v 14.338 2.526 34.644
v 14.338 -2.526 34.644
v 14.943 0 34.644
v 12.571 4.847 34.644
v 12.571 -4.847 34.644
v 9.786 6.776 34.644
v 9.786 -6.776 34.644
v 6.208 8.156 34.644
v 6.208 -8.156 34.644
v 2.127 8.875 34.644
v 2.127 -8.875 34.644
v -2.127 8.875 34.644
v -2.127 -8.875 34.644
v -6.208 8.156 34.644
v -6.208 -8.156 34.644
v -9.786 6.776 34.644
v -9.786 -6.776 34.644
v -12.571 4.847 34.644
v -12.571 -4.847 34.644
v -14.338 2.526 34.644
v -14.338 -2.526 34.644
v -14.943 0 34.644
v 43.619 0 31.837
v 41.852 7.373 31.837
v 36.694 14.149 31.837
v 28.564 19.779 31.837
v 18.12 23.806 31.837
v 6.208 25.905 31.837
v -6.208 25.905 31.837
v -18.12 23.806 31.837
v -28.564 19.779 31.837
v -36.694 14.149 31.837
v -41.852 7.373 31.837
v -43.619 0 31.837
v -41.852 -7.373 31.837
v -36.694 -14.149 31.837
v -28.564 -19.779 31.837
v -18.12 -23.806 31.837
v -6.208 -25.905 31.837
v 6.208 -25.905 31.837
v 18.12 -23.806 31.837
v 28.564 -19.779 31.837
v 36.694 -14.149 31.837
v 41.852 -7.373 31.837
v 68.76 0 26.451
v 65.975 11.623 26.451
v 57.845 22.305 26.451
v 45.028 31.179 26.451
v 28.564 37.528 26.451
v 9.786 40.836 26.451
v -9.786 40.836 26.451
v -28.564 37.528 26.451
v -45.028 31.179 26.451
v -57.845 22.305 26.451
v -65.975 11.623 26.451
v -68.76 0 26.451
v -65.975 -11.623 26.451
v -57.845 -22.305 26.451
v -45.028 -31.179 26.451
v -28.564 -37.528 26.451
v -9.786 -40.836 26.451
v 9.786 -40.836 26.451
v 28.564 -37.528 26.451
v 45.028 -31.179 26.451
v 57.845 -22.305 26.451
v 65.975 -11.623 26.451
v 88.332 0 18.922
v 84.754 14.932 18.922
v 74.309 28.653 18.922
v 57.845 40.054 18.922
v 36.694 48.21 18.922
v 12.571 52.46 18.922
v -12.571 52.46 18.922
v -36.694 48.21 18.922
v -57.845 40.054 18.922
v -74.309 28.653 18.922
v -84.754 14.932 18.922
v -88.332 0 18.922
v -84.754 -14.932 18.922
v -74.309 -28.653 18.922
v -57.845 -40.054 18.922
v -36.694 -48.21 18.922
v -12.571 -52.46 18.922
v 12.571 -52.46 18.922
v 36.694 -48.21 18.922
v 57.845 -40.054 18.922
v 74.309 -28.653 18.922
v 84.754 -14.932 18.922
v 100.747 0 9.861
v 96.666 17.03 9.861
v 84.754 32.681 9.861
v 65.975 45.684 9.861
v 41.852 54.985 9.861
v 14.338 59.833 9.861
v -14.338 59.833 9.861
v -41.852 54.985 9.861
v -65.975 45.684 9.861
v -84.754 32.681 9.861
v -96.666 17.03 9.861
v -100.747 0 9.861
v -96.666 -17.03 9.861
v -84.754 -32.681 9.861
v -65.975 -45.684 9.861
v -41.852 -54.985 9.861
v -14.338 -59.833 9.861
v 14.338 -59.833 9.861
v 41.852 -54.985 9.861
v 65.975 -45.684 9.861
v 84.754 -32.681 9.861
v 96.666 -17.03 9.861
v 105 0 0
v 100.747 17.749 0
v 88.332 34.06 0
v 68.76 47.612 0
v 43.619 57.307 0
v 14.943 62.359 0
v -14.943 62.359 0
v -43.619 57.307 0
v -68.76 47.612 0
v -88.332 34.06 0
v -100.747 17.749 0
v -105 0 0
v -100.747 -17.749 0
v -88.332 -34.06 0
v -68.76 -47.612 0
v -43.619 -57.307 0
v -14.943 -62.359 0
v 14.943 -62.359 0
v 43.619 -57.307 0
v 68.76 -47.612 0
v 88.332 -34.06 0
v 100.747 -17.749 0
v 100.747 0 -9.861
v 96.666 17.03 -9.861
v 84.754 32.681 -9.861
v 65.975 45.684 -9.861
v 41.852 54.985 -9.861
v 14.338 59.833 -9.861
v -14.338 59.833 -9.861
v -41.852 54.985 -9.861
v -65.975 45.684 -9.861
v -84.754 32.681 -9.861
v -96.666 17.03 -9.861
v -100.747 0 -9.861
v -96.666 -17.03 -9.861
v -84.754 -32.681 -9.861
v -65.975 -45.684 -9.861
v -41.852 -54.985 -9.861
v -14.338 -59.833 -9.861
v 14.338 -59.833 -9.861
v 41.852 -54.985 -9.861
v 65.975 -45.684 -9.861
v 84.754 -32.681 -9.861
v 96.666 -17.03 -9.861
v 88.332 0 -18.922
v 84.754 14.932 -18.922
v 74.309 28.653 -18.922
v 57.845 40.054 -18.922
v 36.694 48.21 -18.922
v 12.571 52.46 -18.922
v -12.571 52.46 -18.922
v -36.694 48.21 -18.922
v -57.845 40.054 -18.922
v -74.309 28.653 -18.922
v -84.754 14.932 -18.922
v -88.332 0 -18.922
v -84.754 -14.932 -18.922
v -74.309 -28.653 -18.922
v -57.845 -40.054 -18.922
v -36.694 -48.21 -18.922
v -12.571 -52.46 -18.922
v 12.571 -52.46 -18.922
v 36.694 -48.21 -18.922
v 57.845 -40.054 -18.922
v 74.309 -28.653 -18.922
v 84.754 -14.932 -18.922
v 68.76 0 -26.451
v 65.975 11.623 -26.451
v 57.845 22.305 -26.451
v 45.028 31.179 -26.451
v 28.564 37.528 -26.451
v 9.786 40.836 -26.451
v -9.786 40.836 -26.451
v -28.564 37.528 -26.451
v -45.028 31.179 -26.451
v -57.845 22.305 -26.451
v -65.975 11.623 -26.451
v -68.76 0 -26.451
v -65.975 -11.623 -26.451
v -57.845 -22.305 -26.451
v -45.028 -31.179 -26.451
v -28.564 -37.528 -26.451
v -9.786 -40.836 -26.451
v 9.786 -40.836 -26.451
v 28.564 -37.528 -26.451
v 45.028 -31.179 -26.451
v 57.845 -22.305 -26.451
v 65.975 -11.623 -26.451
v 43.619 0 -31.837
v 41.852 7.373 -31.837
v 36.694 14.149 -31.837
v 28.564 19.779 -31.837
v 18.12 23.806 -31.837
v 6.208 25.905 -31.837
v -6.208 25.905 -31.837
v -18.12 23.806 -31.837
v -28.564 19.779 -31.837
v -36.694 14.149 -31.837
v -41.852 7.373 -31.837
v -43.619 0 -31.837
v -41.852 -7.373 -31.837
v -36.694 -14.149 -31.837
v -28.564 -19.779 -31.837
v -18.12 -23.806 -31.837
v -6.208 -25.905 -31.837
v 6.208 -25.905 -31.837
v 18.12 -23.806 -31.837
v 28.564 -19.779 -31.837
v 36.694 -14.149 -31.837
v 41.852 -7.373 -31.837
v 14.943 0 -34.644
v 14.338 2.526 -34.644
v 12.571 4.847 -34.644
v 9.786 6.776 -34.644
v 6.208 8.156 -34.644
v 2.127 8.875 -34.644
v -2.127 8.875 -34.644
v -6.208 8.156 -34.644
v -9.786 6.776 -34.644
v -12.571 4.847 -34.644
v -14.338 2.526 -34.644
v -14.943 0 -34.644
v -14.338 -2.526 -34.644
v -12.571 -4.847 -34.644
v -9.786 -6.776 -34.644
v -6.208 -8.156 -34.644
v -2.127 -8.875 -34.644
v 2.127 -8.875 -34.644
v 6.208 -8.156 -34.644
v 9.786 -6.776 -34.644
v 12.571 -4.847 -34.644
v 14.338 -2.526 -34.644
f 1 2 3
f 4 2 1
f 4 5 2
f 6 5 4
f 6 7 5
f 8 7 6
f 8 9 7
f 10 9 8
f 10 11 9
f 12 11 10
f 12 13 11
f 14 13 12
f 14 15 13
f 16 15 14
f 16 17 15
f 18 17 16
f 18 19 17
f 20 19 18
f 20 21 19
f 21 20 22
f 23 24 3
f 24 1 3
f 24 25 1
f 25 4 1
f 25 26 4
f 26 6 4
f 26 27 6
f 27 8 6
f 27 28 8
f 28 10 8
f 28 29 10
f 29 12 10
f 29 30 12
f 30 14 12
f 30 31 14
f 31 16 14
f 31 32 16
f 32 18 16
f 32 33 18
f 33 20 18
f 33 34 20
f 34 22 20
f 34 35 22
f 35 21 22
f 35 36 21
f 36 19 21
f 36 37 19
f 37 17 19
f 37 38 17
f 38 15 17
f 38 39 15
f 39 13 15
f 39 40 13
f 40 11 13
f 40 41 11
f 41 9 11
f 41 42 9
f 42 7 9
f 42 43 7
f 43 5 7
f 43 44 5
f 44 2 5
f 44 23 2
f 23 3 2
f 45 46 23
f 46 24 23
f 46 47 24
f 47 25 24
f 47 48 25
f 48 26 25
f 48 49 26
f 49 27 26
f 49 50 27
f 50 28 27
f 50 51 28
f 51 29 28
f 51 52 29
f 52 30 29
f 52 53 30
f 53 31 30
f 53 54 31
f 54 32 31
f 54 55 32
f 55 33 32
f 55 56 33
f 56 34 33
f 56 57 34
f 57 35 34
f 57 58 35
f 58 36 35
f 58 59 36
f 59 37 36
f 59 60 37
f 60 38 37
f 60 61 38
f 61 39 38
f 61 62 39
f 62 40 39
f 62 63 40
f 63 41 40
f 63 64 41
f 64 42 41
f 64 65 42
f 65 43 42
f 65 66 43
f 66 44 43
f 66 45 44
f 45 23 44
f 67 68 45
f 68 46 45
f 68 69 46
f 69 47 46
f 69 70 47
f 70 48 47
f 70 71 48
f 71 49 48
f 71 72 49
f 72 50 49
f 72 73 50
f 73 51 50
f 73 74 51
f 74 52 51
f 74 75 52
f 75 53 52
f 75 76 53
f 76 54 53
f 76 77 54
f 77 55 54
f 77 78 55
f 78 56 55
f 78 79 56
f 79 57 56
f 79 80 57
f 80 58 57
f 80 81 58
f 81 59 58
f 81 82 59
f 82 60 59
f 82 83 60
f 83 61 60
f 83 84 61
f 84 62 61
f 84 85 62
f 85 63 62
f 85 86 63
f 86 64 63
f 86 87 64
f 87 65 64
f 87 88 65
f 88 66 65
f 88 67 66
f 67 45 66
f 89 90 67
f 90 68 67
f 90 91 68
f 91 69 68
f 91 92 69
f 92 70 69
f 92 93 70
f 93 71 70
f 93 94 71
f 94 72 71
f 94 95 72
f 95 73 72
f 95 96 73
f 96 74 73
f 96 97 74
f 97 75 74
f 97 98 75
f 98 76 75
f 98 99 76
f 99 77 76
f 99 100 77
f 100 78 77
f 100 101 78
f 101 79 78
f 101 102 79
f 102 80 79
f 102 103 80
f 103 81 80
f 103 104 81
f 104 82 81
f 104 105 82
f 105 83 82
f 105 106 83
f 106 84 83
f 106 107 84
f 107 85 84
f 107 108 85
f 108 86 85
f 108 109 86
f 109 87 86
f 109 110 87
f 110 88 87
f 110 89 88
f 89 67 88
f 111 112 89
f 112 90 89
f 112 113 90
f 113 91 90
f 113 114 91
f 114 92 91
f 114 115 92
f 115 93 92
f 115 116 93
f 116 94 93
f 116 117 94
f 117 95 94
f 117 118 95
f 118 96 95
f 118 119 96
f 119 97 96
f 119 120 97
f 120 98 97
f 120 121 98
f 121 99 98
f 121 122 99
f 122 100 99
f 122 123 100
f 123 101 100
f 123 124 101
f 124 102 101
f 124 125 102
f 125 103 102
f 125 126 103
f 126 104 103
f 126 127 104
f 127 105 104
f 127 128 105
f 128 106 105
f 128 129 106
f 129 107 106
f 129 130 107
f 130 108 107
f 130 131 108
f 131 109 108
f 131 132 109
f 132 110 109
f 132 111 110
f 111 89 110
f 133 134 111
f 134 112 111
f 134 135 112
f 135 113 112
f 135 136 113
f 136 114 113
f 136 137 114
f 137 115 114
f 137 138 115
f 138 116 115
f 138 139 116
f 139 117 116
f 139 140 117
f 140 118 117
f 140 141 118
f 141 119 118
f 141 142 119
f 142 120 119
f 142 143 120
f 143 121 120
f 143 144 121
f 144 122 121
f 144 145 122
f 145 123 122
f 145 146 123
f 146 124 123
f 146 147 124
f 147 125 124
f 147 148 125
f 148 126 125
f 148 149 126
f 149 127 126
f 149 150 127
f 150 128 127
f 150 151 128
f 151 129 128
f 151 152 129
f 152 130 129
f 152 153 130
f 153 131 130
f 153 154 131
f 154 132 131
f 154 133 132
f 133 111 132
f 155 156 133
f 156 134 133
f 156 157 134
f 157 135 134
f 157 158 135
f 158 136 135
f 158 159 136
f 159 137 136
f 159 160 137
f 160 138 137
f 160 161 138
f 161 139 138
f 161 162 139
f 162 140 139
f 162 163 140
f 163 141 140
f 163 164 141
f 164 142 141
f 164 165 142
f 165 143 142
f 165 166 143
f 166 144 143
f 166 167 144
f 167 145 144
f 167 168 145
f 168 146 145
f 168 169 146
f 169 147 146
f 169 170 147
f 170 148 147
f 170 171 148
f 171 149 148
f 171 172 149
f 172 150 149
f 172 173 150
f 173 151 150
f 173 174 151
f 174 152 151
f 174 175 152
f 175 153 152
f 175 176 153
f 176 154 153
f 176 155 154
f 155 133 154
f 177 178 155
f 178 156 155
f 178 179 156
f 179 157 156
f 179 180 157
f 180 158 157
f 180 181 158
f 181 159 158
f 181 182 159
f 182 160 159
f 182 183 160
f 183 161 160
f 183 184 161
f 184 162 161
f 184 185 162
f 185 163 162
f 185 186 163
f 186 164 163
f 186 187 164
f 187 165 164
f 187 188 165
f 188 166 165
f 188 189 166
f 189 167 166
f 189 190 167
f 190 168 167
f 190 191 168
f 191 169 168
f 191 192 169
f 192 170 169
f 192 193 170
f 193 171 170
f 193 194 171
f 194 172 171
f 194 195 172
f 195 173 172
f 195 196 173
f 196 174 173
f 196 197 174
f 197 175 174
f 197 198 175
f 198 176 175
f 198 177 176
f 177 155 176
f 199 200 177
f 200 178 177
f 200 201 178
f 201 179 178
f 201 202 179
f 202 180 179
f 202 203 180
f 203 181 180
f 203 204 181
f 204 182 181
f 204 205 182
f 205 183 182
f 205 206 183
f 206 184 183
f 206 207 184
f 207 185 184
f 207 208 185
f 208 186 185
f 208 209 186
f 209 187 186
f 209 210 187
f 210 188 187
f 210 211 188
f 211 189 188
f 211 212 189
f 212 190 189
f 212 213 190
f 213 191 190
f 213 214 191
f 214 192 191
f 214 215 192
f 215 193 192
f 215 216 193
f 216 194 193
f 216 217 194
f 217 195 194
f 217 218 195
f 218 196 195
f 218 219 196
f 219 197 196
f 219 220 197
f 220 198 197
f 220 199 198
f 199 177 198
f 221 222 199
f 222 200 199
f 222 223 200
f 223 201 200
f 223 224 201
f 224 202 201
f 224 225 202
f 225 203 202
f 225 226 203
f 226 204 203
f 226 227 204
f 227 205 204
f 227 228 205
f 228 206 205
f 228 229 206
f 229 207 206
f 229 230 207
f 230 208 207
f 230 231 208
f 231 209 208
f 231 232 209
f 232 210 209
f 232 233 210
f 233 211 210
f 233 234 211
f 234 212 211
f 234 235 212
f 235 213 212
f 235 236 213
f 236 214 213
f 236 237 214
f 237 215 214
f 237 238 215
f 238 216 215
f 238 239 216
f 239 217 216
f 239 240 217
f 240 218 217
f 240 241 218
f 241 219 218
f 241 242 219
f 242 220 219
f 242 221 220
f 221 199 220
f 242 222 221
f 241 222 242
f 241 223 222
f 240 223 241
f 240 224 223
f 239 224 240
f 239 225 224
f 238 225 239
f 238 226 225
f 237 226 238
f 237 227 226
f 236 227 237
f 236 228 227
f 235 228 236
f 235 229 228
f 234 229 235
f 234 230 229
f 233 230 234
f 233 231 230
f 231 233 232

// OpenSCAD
// Generated by SolidPython 1.0.1 on 2020-07-29 00:46:51


scale(v = [15, 9, 5]) {
	sphere(r = 7);
}
/***********************************************
*********      SolidPython code:      **********
************************************************
 
# import packages: SolidPython
from solid import *
from solid.utils import *
from itertools import chain, combinations, permutations


class Resize:

    def __init__(self, scad_file):
        self.scad_file = scad_file
        #self.scad_file = import_scad(scad_file)
        # cone/cylinder param:
        self.r1 = 0
        self.r2 = 0
        self.h = 0
        # rectangular prism param:
        self.w = 0
        self.l = 0
        # ellipse param:
        self.r = 0

    # import OpenScad code (file name corresponds to shape)


    # classify shape + parameters
    def assign(self, param1, param2, param3):
        if self.scad_file == 'cone.scad':
            self.r1 = param1
            self.r2 = param2
            self.h = param3
        elif self.scad_file == 'cylinder.scad':
            self.r1 = param1
            self.r2 = param2
            self.h = param3
        elif self.scad_file == 'rectangularPrism.scad':
            self.h = param1
            self.l = param2
            self.w = param3
        else:
            self.r = param1
            self.h = param2

    # resize parameters
    def iterate(self):
        x = range(3, 20, 2)
        i = 1
        if self.scad_file == 'cone.scad':
            tempList = list(permutations(x, 2))
            for temp in tempList:
                param1 = temp[0]
                param2 = temp[1]
                filepath = 'produced_scad_files/' + 'cone' + str(param1) + '_' + str(param2) + '_' + '.scad'
                scad_render_to_file(cylinder(h=param1, r1=param2, r2=0), filepath)

        elif self.scad_file == 'cylinder.scad':
            tempList = list(permutations(x, 3))
            for temp in tempList:
                param1 = temp[0]
                param2 = temp[1]
                filepath = 'produced_scad_files/' + 'cylinder' + str(param1) + '_' + str(param2) + '_' + '.scad'
                scad_render_to_file(cylinder(h=param1, r1=param2, r2=param2), filepath)

        elif self.scad_file == 'rectangularPrism.scad':
            tempList = list(permutations(x, 3))
            for temp in tempList:
                param1 = temp[0]
                param2 = temp[1]
                param3 = temp[2]
                filepath = 'produced_scad_files/' + 'rectangularPrism' + str(param1) + '_' + str(param2) + '_' + str(
                    param3) + '.scad'
                scad_render_to_file(cube(size=(param1, param2, param3)), filepath)

        elif self.scad_file == 'ellipse.scad':
            tempList = list(permutations(x, 4))
            for temp in tempList:
                param1 = temp[0]
                param2 = temp[1]
                param3 = temp[2]
                param4 = temp[3]
                filepath = 'produced_scad_files/' + 'ellipse' + str(param1) + '_' + str(param2) + '_' + str(param3) + '_' + str(param4) + '.scad'
                scad_render_to_file(scale([param1, param2, param3])(sphere(r=param4)), filepath)

    def render_to_scadfile(self):
        scad_render_to_file(scad, 'example.scad') 
 
************************************************/
